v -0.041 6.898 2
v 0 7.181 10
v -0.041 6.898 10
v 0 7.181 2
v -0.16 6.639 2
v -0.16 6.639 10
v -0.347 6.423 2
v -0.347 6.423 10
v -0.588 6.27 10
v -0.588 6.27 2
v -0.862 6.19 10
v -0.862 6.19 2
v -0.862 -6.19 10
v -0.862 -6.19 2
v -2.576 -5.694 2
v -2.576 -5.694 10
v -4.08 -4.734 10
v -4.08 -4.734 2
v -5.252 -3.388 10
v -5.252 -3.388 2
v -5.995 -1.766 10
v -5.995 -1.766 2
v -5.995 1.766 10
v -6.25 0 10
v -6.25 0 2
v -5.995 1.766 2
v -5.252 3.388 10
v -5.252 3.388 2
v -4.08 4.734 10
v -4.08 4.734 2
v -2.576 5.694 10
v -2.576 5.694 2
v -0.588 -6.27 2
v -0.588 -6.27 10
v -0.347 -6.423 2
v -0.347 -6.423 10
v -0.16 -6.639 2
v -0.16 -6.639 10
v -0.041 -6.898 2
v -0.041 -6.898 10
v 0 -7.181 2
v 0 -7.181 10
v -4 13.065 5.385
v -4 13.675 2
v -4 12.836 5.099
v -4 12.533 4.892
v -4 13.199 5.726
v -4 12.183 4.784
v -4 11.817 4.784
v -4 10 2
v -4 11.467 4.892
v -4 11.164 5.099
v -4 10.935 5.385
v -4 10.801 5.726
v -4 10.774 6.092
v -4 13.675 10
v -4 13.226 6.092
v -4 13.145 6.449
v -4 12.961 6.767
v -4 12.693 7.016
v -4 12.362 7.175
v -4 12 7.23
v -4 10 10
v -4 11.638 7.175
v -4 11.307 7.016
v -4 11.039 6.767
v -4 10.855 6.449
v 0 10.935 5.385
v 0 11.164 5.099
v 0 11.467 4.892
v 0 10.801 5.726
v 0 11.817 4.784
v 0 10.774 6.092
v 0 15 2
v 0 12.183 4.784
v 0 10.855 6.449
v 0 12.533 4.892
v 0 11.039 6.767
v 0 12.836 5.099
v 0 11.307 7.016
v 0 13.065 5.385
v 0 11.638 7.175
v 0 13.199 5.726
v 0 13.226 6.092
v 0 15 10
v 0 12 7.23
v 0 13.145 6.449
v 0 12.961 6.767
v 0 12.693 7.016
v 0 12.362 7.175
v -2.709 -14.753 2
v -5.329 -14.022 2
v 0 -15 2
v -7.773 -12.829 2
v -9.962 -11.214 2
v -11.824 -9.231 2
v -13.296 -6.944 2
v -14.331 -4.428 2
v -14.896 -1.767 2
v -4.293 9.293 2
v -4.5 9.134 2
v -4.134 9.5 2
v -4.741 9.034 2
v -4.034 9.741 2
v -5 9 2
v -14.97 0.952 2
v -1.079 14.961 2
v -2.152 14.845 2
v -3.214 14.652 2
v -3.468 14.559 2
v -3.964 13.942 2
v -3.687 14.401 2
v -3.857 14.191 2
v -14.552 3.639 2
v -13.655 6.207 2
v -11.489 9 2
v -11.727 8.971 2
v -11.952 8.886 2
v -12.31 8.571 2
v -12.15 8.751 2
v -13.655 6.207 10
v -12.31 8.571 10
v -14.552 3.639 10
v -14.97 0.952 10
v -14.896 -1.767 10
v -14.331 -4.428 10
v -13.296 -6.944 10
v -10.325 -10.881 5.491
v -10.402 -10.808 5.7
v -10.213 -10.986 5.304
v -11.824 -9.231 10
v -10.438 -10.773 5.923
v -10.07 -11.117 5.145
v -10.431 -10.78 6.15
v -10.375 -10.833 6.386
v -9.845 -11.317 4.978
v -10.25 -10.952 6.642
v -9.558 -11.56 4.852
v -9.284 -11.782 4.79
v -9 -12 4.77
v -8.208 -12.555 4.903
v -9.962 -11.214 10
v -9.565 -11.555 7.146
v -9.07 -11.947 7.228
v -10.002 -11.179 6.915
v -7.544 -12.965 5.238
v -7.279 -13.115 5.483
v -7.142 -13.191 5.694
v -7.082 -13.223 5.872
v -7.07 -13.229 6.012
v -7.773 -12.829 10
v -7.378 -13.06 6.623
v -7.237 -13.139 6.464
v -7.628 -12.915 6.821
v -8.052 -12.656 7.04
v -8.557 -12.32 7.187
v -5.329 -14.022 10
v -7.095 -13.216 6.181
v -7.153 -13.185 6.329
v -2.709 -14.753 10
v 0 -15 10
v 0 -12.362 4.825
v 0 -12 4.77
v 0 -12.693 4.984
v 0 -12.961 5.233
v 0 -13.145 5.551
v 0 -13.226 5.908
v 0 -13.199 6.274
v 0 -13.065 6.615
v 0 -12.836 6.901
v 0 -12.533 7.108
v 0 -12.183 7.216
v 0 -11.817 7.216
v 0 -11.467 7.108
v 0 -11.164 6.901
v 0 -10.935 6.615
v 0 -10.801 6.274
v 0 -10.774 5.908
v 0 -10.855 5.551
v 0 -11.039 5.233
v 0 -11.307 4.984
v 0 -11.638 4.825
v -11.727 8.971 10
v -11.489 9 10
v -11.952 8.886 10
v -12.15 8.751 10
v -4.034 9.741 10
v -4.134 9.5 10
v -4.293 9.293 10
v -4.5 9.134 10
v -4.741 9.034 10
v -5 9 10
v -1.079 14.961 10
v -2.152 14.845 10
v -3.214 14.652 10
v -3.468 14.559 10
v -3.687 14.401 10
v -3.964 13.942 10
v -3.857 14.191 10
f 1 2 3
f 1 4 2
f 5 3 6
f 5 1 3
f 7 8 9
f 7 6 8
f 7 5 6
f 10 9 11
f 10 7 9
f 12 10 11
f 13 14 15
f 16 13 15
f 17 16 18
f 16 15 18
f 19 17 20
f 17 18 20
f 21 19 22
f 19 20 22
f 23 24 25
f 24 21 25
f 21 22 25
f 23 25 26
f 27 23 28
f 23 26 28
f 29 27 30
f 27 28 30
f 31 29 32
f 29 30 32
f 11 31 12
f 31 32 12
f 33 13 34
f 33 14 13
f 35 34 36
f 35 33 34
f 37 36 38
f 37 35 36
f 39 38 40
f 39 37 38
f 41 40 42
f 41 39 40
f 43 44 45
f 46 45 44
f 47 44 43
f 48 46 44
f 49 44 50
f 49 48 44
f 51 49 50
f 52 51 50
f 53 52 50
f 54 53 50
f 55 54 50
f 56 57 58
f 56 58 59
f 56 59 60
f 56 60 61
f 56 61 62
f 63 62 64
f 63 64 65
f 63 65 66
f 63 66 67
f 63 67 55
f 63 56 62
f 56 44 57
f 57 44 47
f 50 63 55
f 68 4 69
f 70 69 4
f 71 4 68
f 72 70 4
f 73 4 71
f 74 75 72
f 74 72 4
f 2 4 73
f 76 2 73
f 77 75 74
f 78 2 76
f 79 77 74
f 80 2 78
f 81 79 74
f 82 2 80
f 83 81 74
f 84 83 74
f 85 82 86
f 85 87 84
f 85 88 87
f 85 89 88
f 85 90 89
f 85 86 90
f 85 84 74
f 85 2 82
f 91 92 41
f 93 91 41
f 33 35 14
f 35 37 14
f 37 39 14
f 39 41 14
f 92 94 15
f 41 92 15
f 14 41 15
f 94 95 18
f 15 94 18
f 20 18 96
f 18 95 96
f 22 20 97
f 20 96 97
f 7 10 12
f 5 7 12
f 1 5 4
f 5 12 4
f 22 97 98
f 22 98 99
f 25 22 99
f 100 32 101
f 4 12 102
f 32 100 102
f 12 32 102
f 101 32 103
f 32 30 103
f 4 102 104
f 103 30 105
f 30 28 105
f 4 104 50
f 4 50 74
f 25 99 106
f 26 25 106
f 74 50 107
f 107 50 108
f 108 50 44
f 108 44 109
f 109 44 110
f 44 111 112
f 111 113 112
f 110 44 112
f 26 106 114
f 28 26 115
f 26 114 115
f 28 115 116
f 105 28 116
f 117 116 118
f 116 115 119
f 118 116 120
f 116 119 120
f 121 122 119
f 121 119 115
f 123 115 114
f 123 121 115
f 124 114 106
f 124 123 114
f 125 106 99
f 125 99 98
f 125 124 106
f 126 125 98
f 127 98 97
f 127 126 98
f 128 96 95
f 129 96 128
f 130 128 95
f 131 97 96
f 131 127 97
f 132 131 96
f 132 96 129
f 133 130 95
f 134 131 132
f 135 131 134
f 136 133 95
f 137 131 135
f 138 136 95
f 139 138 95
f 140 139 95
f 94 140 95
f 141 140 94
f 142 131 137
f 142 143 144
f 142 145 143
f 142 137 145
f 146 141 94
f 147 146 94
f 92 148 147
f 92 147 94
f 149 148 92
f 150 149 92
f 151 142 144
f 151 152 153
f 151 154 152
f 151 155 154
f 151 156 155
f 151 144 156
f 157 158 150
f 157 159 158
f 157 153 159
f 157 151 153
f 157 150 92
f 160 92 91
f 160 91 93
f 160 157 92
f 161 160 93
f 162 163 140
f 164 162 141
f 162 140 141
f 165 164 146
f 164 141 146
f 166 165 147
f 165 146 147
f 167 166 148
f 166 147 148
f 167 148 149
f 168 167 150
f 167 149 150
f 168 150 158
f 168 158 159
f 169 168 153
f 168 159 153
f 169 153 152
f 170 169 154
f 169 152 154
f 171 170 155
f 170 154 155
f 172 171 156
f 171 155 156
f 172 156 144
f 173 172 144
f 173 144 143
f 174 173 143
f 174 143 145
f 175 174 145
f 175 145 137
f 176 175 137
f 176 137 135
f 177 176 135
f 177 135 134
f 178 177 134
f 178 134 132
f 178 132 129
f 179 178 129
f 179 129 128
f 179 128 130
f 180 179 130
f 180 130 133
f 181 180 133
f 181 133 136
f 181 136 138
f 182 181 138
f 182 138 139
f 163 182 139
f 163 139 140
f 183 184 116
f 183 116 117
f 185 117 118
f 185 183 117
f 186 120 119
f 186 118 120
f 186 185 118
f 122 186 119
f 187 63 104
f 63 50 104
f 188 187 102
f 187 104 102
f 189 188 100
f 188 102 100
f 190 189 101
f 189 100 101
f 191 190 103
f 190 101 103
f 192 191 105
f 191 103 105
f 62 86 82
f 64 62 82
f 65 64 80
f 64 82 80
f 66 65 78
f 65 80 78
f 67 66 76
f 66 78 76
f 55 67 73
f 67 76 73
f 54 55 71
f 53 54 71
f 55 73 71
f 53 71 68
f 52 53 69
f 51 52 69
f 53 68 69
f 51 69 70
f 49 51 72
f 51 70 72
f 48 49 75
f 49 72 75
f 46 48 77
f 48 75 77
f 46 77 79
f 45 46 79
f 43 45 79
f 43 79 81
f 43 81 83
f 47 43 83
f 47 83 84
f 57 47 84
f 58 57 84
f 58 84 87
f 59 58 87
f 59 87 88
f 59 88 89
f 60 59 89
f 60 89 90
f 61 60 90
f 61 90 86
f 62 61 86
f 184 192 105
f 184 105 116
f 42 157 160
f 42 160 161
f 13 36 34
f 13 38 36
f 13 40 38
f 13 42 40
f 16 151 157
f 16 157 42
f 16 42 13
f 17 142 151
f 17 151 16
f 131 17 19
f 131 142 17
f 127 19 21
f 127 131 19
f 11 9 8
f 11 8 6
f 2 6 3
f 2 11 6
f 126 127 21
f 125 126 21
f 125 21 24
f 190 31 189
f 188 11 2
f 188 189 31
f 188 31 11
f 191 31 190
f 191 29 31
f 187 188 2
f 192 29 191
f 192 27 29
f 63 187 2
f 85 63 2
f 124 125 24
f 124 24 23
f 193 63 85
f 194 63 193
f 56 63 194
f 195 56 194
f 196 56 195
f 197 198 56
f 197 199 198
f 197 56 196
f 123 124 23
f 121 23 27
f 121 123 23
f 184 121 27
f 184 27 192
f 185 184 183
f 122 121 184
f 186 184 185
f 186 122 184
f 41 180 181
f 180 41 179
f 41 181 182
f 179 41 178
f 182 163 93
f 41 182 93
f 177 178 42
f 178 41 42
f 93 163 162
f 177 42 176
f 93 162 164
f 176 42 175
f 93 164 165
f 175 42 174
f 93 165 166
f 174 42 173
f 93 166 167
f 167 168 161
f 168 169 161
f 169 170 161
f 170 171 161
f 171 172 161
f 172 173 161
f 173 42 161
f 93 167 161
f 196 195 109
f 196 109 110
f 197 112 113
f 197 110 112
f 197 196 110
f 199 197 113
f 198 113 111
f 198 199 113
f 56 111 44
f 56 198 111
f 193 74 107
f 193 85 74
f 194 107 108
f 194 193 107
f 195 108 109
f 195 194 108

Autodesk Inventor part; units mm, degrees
ref_plane "YZ Plane" through (0, 0, 0) normal (1, 0, 0) x (0, 1, 0)
ref_plane "XZ Plane" through (0, 0, 0) normal (0, 1, 0) x (-1, 0, 0)
ref_plane "XY Plane" through (0, 0, 0) normal (0, 0, 1) x (1, 0, 0)
sketch "スケッチ1" plane through (0, 0, 0) normal (1, 0, 0) x (0, 1, 0)
  line L0 (0, 0) -> (6.25, 0) construction
  line L1 (6.25, 0) -> (6.25, 2) construction
  line L2 (6.25, 2) -> (15, 2)
  line L3 (15, 2) -> (15, 10)
  line L4 (15, 10) -> (6.25, 10)
  line L5 (6.25, 10) -> (6.25, 2)
  line L6 (0, -2) -> (0, 12) projected
  dimension "d0" = 6.25
  dimension "d4" = 8.75
  dimension "d5" = 8
revolve "回転1" add sketch "スケッチ1" angle 180 about axis through (0, 0, -10) along (0, 0, 1)
sketch "スケッチ2" plane through (0, 6.25, 10) normal (0, 0, 1) x (1, 0, 0)
  line L0 (0, 8.75) -> (0, 2.75) construction
  line L1 (0, 0) -> (0, 8.75) projected
  line L2 (0, 2.75) -> (-4, 2.75) construction
  line L3 (-4, 2.75) -> (-12.5738, 2.75)
  line L4 (-12.5738, 2.75) -> (-12.5738, 9.025)
  line L5 (-12.5738, 9.025) -> (-4, 9.025)
  line L6 (-4, 9.025) -> (-4, 2.75)
  point P0 (0, -6.25)
  dimension "d7" = 6
  dimension "d8" = 4
extrude "押し出し1" cut sketch "スケッチ2" against normal through all
sketch "スケッチ4" plane through (0, -15, 2) normal (1, 0, 0) x (0, 0, -1)
  line L0 (-8, 0) -> (0, 0) projected
  line L1 (0, 0) -> (0, 8.75) projected
  point P0 (2, 15)
  point P1 (-4, 3)
  dimension "d20" = 3
  dimension "d28" = 4
hole "穴2" at (0, -12, 6) direction (-1, 0, 0) diameter 2.459 end through all thread size "M3x0.5" class "6H" standard "ANSI Metric M Profile"
fillet "フィレット2" radius 1 5 edges at (-4, 14.4568, 6) (-4, 9, 6) (-12, 9, 6) (0, 6.25, 6) (0, -6.25, 6)
sketch "スケッチ6" plane through (-4, 10, 10) normal (-1, 0, 0) x (0, 0, 1)
  line L0 (-8, 0) -> (-8, 3.6748) projected
  line L1 (-8, -1) -> (0, -1) projected
  point P0 (-10, -10)
  point P1 (-4, 2)
  dimension "d40" = 4
  dimension "d41" = 3
hole "穴4" at (-4, 12, 6) direction (1, 0, 0) diameter 2.459 end through all thread size "M3x0.5" class "6H" standard "ANSI Metric M Profile"
properties part number "clamp-ring" material "ステンレス鋼"
